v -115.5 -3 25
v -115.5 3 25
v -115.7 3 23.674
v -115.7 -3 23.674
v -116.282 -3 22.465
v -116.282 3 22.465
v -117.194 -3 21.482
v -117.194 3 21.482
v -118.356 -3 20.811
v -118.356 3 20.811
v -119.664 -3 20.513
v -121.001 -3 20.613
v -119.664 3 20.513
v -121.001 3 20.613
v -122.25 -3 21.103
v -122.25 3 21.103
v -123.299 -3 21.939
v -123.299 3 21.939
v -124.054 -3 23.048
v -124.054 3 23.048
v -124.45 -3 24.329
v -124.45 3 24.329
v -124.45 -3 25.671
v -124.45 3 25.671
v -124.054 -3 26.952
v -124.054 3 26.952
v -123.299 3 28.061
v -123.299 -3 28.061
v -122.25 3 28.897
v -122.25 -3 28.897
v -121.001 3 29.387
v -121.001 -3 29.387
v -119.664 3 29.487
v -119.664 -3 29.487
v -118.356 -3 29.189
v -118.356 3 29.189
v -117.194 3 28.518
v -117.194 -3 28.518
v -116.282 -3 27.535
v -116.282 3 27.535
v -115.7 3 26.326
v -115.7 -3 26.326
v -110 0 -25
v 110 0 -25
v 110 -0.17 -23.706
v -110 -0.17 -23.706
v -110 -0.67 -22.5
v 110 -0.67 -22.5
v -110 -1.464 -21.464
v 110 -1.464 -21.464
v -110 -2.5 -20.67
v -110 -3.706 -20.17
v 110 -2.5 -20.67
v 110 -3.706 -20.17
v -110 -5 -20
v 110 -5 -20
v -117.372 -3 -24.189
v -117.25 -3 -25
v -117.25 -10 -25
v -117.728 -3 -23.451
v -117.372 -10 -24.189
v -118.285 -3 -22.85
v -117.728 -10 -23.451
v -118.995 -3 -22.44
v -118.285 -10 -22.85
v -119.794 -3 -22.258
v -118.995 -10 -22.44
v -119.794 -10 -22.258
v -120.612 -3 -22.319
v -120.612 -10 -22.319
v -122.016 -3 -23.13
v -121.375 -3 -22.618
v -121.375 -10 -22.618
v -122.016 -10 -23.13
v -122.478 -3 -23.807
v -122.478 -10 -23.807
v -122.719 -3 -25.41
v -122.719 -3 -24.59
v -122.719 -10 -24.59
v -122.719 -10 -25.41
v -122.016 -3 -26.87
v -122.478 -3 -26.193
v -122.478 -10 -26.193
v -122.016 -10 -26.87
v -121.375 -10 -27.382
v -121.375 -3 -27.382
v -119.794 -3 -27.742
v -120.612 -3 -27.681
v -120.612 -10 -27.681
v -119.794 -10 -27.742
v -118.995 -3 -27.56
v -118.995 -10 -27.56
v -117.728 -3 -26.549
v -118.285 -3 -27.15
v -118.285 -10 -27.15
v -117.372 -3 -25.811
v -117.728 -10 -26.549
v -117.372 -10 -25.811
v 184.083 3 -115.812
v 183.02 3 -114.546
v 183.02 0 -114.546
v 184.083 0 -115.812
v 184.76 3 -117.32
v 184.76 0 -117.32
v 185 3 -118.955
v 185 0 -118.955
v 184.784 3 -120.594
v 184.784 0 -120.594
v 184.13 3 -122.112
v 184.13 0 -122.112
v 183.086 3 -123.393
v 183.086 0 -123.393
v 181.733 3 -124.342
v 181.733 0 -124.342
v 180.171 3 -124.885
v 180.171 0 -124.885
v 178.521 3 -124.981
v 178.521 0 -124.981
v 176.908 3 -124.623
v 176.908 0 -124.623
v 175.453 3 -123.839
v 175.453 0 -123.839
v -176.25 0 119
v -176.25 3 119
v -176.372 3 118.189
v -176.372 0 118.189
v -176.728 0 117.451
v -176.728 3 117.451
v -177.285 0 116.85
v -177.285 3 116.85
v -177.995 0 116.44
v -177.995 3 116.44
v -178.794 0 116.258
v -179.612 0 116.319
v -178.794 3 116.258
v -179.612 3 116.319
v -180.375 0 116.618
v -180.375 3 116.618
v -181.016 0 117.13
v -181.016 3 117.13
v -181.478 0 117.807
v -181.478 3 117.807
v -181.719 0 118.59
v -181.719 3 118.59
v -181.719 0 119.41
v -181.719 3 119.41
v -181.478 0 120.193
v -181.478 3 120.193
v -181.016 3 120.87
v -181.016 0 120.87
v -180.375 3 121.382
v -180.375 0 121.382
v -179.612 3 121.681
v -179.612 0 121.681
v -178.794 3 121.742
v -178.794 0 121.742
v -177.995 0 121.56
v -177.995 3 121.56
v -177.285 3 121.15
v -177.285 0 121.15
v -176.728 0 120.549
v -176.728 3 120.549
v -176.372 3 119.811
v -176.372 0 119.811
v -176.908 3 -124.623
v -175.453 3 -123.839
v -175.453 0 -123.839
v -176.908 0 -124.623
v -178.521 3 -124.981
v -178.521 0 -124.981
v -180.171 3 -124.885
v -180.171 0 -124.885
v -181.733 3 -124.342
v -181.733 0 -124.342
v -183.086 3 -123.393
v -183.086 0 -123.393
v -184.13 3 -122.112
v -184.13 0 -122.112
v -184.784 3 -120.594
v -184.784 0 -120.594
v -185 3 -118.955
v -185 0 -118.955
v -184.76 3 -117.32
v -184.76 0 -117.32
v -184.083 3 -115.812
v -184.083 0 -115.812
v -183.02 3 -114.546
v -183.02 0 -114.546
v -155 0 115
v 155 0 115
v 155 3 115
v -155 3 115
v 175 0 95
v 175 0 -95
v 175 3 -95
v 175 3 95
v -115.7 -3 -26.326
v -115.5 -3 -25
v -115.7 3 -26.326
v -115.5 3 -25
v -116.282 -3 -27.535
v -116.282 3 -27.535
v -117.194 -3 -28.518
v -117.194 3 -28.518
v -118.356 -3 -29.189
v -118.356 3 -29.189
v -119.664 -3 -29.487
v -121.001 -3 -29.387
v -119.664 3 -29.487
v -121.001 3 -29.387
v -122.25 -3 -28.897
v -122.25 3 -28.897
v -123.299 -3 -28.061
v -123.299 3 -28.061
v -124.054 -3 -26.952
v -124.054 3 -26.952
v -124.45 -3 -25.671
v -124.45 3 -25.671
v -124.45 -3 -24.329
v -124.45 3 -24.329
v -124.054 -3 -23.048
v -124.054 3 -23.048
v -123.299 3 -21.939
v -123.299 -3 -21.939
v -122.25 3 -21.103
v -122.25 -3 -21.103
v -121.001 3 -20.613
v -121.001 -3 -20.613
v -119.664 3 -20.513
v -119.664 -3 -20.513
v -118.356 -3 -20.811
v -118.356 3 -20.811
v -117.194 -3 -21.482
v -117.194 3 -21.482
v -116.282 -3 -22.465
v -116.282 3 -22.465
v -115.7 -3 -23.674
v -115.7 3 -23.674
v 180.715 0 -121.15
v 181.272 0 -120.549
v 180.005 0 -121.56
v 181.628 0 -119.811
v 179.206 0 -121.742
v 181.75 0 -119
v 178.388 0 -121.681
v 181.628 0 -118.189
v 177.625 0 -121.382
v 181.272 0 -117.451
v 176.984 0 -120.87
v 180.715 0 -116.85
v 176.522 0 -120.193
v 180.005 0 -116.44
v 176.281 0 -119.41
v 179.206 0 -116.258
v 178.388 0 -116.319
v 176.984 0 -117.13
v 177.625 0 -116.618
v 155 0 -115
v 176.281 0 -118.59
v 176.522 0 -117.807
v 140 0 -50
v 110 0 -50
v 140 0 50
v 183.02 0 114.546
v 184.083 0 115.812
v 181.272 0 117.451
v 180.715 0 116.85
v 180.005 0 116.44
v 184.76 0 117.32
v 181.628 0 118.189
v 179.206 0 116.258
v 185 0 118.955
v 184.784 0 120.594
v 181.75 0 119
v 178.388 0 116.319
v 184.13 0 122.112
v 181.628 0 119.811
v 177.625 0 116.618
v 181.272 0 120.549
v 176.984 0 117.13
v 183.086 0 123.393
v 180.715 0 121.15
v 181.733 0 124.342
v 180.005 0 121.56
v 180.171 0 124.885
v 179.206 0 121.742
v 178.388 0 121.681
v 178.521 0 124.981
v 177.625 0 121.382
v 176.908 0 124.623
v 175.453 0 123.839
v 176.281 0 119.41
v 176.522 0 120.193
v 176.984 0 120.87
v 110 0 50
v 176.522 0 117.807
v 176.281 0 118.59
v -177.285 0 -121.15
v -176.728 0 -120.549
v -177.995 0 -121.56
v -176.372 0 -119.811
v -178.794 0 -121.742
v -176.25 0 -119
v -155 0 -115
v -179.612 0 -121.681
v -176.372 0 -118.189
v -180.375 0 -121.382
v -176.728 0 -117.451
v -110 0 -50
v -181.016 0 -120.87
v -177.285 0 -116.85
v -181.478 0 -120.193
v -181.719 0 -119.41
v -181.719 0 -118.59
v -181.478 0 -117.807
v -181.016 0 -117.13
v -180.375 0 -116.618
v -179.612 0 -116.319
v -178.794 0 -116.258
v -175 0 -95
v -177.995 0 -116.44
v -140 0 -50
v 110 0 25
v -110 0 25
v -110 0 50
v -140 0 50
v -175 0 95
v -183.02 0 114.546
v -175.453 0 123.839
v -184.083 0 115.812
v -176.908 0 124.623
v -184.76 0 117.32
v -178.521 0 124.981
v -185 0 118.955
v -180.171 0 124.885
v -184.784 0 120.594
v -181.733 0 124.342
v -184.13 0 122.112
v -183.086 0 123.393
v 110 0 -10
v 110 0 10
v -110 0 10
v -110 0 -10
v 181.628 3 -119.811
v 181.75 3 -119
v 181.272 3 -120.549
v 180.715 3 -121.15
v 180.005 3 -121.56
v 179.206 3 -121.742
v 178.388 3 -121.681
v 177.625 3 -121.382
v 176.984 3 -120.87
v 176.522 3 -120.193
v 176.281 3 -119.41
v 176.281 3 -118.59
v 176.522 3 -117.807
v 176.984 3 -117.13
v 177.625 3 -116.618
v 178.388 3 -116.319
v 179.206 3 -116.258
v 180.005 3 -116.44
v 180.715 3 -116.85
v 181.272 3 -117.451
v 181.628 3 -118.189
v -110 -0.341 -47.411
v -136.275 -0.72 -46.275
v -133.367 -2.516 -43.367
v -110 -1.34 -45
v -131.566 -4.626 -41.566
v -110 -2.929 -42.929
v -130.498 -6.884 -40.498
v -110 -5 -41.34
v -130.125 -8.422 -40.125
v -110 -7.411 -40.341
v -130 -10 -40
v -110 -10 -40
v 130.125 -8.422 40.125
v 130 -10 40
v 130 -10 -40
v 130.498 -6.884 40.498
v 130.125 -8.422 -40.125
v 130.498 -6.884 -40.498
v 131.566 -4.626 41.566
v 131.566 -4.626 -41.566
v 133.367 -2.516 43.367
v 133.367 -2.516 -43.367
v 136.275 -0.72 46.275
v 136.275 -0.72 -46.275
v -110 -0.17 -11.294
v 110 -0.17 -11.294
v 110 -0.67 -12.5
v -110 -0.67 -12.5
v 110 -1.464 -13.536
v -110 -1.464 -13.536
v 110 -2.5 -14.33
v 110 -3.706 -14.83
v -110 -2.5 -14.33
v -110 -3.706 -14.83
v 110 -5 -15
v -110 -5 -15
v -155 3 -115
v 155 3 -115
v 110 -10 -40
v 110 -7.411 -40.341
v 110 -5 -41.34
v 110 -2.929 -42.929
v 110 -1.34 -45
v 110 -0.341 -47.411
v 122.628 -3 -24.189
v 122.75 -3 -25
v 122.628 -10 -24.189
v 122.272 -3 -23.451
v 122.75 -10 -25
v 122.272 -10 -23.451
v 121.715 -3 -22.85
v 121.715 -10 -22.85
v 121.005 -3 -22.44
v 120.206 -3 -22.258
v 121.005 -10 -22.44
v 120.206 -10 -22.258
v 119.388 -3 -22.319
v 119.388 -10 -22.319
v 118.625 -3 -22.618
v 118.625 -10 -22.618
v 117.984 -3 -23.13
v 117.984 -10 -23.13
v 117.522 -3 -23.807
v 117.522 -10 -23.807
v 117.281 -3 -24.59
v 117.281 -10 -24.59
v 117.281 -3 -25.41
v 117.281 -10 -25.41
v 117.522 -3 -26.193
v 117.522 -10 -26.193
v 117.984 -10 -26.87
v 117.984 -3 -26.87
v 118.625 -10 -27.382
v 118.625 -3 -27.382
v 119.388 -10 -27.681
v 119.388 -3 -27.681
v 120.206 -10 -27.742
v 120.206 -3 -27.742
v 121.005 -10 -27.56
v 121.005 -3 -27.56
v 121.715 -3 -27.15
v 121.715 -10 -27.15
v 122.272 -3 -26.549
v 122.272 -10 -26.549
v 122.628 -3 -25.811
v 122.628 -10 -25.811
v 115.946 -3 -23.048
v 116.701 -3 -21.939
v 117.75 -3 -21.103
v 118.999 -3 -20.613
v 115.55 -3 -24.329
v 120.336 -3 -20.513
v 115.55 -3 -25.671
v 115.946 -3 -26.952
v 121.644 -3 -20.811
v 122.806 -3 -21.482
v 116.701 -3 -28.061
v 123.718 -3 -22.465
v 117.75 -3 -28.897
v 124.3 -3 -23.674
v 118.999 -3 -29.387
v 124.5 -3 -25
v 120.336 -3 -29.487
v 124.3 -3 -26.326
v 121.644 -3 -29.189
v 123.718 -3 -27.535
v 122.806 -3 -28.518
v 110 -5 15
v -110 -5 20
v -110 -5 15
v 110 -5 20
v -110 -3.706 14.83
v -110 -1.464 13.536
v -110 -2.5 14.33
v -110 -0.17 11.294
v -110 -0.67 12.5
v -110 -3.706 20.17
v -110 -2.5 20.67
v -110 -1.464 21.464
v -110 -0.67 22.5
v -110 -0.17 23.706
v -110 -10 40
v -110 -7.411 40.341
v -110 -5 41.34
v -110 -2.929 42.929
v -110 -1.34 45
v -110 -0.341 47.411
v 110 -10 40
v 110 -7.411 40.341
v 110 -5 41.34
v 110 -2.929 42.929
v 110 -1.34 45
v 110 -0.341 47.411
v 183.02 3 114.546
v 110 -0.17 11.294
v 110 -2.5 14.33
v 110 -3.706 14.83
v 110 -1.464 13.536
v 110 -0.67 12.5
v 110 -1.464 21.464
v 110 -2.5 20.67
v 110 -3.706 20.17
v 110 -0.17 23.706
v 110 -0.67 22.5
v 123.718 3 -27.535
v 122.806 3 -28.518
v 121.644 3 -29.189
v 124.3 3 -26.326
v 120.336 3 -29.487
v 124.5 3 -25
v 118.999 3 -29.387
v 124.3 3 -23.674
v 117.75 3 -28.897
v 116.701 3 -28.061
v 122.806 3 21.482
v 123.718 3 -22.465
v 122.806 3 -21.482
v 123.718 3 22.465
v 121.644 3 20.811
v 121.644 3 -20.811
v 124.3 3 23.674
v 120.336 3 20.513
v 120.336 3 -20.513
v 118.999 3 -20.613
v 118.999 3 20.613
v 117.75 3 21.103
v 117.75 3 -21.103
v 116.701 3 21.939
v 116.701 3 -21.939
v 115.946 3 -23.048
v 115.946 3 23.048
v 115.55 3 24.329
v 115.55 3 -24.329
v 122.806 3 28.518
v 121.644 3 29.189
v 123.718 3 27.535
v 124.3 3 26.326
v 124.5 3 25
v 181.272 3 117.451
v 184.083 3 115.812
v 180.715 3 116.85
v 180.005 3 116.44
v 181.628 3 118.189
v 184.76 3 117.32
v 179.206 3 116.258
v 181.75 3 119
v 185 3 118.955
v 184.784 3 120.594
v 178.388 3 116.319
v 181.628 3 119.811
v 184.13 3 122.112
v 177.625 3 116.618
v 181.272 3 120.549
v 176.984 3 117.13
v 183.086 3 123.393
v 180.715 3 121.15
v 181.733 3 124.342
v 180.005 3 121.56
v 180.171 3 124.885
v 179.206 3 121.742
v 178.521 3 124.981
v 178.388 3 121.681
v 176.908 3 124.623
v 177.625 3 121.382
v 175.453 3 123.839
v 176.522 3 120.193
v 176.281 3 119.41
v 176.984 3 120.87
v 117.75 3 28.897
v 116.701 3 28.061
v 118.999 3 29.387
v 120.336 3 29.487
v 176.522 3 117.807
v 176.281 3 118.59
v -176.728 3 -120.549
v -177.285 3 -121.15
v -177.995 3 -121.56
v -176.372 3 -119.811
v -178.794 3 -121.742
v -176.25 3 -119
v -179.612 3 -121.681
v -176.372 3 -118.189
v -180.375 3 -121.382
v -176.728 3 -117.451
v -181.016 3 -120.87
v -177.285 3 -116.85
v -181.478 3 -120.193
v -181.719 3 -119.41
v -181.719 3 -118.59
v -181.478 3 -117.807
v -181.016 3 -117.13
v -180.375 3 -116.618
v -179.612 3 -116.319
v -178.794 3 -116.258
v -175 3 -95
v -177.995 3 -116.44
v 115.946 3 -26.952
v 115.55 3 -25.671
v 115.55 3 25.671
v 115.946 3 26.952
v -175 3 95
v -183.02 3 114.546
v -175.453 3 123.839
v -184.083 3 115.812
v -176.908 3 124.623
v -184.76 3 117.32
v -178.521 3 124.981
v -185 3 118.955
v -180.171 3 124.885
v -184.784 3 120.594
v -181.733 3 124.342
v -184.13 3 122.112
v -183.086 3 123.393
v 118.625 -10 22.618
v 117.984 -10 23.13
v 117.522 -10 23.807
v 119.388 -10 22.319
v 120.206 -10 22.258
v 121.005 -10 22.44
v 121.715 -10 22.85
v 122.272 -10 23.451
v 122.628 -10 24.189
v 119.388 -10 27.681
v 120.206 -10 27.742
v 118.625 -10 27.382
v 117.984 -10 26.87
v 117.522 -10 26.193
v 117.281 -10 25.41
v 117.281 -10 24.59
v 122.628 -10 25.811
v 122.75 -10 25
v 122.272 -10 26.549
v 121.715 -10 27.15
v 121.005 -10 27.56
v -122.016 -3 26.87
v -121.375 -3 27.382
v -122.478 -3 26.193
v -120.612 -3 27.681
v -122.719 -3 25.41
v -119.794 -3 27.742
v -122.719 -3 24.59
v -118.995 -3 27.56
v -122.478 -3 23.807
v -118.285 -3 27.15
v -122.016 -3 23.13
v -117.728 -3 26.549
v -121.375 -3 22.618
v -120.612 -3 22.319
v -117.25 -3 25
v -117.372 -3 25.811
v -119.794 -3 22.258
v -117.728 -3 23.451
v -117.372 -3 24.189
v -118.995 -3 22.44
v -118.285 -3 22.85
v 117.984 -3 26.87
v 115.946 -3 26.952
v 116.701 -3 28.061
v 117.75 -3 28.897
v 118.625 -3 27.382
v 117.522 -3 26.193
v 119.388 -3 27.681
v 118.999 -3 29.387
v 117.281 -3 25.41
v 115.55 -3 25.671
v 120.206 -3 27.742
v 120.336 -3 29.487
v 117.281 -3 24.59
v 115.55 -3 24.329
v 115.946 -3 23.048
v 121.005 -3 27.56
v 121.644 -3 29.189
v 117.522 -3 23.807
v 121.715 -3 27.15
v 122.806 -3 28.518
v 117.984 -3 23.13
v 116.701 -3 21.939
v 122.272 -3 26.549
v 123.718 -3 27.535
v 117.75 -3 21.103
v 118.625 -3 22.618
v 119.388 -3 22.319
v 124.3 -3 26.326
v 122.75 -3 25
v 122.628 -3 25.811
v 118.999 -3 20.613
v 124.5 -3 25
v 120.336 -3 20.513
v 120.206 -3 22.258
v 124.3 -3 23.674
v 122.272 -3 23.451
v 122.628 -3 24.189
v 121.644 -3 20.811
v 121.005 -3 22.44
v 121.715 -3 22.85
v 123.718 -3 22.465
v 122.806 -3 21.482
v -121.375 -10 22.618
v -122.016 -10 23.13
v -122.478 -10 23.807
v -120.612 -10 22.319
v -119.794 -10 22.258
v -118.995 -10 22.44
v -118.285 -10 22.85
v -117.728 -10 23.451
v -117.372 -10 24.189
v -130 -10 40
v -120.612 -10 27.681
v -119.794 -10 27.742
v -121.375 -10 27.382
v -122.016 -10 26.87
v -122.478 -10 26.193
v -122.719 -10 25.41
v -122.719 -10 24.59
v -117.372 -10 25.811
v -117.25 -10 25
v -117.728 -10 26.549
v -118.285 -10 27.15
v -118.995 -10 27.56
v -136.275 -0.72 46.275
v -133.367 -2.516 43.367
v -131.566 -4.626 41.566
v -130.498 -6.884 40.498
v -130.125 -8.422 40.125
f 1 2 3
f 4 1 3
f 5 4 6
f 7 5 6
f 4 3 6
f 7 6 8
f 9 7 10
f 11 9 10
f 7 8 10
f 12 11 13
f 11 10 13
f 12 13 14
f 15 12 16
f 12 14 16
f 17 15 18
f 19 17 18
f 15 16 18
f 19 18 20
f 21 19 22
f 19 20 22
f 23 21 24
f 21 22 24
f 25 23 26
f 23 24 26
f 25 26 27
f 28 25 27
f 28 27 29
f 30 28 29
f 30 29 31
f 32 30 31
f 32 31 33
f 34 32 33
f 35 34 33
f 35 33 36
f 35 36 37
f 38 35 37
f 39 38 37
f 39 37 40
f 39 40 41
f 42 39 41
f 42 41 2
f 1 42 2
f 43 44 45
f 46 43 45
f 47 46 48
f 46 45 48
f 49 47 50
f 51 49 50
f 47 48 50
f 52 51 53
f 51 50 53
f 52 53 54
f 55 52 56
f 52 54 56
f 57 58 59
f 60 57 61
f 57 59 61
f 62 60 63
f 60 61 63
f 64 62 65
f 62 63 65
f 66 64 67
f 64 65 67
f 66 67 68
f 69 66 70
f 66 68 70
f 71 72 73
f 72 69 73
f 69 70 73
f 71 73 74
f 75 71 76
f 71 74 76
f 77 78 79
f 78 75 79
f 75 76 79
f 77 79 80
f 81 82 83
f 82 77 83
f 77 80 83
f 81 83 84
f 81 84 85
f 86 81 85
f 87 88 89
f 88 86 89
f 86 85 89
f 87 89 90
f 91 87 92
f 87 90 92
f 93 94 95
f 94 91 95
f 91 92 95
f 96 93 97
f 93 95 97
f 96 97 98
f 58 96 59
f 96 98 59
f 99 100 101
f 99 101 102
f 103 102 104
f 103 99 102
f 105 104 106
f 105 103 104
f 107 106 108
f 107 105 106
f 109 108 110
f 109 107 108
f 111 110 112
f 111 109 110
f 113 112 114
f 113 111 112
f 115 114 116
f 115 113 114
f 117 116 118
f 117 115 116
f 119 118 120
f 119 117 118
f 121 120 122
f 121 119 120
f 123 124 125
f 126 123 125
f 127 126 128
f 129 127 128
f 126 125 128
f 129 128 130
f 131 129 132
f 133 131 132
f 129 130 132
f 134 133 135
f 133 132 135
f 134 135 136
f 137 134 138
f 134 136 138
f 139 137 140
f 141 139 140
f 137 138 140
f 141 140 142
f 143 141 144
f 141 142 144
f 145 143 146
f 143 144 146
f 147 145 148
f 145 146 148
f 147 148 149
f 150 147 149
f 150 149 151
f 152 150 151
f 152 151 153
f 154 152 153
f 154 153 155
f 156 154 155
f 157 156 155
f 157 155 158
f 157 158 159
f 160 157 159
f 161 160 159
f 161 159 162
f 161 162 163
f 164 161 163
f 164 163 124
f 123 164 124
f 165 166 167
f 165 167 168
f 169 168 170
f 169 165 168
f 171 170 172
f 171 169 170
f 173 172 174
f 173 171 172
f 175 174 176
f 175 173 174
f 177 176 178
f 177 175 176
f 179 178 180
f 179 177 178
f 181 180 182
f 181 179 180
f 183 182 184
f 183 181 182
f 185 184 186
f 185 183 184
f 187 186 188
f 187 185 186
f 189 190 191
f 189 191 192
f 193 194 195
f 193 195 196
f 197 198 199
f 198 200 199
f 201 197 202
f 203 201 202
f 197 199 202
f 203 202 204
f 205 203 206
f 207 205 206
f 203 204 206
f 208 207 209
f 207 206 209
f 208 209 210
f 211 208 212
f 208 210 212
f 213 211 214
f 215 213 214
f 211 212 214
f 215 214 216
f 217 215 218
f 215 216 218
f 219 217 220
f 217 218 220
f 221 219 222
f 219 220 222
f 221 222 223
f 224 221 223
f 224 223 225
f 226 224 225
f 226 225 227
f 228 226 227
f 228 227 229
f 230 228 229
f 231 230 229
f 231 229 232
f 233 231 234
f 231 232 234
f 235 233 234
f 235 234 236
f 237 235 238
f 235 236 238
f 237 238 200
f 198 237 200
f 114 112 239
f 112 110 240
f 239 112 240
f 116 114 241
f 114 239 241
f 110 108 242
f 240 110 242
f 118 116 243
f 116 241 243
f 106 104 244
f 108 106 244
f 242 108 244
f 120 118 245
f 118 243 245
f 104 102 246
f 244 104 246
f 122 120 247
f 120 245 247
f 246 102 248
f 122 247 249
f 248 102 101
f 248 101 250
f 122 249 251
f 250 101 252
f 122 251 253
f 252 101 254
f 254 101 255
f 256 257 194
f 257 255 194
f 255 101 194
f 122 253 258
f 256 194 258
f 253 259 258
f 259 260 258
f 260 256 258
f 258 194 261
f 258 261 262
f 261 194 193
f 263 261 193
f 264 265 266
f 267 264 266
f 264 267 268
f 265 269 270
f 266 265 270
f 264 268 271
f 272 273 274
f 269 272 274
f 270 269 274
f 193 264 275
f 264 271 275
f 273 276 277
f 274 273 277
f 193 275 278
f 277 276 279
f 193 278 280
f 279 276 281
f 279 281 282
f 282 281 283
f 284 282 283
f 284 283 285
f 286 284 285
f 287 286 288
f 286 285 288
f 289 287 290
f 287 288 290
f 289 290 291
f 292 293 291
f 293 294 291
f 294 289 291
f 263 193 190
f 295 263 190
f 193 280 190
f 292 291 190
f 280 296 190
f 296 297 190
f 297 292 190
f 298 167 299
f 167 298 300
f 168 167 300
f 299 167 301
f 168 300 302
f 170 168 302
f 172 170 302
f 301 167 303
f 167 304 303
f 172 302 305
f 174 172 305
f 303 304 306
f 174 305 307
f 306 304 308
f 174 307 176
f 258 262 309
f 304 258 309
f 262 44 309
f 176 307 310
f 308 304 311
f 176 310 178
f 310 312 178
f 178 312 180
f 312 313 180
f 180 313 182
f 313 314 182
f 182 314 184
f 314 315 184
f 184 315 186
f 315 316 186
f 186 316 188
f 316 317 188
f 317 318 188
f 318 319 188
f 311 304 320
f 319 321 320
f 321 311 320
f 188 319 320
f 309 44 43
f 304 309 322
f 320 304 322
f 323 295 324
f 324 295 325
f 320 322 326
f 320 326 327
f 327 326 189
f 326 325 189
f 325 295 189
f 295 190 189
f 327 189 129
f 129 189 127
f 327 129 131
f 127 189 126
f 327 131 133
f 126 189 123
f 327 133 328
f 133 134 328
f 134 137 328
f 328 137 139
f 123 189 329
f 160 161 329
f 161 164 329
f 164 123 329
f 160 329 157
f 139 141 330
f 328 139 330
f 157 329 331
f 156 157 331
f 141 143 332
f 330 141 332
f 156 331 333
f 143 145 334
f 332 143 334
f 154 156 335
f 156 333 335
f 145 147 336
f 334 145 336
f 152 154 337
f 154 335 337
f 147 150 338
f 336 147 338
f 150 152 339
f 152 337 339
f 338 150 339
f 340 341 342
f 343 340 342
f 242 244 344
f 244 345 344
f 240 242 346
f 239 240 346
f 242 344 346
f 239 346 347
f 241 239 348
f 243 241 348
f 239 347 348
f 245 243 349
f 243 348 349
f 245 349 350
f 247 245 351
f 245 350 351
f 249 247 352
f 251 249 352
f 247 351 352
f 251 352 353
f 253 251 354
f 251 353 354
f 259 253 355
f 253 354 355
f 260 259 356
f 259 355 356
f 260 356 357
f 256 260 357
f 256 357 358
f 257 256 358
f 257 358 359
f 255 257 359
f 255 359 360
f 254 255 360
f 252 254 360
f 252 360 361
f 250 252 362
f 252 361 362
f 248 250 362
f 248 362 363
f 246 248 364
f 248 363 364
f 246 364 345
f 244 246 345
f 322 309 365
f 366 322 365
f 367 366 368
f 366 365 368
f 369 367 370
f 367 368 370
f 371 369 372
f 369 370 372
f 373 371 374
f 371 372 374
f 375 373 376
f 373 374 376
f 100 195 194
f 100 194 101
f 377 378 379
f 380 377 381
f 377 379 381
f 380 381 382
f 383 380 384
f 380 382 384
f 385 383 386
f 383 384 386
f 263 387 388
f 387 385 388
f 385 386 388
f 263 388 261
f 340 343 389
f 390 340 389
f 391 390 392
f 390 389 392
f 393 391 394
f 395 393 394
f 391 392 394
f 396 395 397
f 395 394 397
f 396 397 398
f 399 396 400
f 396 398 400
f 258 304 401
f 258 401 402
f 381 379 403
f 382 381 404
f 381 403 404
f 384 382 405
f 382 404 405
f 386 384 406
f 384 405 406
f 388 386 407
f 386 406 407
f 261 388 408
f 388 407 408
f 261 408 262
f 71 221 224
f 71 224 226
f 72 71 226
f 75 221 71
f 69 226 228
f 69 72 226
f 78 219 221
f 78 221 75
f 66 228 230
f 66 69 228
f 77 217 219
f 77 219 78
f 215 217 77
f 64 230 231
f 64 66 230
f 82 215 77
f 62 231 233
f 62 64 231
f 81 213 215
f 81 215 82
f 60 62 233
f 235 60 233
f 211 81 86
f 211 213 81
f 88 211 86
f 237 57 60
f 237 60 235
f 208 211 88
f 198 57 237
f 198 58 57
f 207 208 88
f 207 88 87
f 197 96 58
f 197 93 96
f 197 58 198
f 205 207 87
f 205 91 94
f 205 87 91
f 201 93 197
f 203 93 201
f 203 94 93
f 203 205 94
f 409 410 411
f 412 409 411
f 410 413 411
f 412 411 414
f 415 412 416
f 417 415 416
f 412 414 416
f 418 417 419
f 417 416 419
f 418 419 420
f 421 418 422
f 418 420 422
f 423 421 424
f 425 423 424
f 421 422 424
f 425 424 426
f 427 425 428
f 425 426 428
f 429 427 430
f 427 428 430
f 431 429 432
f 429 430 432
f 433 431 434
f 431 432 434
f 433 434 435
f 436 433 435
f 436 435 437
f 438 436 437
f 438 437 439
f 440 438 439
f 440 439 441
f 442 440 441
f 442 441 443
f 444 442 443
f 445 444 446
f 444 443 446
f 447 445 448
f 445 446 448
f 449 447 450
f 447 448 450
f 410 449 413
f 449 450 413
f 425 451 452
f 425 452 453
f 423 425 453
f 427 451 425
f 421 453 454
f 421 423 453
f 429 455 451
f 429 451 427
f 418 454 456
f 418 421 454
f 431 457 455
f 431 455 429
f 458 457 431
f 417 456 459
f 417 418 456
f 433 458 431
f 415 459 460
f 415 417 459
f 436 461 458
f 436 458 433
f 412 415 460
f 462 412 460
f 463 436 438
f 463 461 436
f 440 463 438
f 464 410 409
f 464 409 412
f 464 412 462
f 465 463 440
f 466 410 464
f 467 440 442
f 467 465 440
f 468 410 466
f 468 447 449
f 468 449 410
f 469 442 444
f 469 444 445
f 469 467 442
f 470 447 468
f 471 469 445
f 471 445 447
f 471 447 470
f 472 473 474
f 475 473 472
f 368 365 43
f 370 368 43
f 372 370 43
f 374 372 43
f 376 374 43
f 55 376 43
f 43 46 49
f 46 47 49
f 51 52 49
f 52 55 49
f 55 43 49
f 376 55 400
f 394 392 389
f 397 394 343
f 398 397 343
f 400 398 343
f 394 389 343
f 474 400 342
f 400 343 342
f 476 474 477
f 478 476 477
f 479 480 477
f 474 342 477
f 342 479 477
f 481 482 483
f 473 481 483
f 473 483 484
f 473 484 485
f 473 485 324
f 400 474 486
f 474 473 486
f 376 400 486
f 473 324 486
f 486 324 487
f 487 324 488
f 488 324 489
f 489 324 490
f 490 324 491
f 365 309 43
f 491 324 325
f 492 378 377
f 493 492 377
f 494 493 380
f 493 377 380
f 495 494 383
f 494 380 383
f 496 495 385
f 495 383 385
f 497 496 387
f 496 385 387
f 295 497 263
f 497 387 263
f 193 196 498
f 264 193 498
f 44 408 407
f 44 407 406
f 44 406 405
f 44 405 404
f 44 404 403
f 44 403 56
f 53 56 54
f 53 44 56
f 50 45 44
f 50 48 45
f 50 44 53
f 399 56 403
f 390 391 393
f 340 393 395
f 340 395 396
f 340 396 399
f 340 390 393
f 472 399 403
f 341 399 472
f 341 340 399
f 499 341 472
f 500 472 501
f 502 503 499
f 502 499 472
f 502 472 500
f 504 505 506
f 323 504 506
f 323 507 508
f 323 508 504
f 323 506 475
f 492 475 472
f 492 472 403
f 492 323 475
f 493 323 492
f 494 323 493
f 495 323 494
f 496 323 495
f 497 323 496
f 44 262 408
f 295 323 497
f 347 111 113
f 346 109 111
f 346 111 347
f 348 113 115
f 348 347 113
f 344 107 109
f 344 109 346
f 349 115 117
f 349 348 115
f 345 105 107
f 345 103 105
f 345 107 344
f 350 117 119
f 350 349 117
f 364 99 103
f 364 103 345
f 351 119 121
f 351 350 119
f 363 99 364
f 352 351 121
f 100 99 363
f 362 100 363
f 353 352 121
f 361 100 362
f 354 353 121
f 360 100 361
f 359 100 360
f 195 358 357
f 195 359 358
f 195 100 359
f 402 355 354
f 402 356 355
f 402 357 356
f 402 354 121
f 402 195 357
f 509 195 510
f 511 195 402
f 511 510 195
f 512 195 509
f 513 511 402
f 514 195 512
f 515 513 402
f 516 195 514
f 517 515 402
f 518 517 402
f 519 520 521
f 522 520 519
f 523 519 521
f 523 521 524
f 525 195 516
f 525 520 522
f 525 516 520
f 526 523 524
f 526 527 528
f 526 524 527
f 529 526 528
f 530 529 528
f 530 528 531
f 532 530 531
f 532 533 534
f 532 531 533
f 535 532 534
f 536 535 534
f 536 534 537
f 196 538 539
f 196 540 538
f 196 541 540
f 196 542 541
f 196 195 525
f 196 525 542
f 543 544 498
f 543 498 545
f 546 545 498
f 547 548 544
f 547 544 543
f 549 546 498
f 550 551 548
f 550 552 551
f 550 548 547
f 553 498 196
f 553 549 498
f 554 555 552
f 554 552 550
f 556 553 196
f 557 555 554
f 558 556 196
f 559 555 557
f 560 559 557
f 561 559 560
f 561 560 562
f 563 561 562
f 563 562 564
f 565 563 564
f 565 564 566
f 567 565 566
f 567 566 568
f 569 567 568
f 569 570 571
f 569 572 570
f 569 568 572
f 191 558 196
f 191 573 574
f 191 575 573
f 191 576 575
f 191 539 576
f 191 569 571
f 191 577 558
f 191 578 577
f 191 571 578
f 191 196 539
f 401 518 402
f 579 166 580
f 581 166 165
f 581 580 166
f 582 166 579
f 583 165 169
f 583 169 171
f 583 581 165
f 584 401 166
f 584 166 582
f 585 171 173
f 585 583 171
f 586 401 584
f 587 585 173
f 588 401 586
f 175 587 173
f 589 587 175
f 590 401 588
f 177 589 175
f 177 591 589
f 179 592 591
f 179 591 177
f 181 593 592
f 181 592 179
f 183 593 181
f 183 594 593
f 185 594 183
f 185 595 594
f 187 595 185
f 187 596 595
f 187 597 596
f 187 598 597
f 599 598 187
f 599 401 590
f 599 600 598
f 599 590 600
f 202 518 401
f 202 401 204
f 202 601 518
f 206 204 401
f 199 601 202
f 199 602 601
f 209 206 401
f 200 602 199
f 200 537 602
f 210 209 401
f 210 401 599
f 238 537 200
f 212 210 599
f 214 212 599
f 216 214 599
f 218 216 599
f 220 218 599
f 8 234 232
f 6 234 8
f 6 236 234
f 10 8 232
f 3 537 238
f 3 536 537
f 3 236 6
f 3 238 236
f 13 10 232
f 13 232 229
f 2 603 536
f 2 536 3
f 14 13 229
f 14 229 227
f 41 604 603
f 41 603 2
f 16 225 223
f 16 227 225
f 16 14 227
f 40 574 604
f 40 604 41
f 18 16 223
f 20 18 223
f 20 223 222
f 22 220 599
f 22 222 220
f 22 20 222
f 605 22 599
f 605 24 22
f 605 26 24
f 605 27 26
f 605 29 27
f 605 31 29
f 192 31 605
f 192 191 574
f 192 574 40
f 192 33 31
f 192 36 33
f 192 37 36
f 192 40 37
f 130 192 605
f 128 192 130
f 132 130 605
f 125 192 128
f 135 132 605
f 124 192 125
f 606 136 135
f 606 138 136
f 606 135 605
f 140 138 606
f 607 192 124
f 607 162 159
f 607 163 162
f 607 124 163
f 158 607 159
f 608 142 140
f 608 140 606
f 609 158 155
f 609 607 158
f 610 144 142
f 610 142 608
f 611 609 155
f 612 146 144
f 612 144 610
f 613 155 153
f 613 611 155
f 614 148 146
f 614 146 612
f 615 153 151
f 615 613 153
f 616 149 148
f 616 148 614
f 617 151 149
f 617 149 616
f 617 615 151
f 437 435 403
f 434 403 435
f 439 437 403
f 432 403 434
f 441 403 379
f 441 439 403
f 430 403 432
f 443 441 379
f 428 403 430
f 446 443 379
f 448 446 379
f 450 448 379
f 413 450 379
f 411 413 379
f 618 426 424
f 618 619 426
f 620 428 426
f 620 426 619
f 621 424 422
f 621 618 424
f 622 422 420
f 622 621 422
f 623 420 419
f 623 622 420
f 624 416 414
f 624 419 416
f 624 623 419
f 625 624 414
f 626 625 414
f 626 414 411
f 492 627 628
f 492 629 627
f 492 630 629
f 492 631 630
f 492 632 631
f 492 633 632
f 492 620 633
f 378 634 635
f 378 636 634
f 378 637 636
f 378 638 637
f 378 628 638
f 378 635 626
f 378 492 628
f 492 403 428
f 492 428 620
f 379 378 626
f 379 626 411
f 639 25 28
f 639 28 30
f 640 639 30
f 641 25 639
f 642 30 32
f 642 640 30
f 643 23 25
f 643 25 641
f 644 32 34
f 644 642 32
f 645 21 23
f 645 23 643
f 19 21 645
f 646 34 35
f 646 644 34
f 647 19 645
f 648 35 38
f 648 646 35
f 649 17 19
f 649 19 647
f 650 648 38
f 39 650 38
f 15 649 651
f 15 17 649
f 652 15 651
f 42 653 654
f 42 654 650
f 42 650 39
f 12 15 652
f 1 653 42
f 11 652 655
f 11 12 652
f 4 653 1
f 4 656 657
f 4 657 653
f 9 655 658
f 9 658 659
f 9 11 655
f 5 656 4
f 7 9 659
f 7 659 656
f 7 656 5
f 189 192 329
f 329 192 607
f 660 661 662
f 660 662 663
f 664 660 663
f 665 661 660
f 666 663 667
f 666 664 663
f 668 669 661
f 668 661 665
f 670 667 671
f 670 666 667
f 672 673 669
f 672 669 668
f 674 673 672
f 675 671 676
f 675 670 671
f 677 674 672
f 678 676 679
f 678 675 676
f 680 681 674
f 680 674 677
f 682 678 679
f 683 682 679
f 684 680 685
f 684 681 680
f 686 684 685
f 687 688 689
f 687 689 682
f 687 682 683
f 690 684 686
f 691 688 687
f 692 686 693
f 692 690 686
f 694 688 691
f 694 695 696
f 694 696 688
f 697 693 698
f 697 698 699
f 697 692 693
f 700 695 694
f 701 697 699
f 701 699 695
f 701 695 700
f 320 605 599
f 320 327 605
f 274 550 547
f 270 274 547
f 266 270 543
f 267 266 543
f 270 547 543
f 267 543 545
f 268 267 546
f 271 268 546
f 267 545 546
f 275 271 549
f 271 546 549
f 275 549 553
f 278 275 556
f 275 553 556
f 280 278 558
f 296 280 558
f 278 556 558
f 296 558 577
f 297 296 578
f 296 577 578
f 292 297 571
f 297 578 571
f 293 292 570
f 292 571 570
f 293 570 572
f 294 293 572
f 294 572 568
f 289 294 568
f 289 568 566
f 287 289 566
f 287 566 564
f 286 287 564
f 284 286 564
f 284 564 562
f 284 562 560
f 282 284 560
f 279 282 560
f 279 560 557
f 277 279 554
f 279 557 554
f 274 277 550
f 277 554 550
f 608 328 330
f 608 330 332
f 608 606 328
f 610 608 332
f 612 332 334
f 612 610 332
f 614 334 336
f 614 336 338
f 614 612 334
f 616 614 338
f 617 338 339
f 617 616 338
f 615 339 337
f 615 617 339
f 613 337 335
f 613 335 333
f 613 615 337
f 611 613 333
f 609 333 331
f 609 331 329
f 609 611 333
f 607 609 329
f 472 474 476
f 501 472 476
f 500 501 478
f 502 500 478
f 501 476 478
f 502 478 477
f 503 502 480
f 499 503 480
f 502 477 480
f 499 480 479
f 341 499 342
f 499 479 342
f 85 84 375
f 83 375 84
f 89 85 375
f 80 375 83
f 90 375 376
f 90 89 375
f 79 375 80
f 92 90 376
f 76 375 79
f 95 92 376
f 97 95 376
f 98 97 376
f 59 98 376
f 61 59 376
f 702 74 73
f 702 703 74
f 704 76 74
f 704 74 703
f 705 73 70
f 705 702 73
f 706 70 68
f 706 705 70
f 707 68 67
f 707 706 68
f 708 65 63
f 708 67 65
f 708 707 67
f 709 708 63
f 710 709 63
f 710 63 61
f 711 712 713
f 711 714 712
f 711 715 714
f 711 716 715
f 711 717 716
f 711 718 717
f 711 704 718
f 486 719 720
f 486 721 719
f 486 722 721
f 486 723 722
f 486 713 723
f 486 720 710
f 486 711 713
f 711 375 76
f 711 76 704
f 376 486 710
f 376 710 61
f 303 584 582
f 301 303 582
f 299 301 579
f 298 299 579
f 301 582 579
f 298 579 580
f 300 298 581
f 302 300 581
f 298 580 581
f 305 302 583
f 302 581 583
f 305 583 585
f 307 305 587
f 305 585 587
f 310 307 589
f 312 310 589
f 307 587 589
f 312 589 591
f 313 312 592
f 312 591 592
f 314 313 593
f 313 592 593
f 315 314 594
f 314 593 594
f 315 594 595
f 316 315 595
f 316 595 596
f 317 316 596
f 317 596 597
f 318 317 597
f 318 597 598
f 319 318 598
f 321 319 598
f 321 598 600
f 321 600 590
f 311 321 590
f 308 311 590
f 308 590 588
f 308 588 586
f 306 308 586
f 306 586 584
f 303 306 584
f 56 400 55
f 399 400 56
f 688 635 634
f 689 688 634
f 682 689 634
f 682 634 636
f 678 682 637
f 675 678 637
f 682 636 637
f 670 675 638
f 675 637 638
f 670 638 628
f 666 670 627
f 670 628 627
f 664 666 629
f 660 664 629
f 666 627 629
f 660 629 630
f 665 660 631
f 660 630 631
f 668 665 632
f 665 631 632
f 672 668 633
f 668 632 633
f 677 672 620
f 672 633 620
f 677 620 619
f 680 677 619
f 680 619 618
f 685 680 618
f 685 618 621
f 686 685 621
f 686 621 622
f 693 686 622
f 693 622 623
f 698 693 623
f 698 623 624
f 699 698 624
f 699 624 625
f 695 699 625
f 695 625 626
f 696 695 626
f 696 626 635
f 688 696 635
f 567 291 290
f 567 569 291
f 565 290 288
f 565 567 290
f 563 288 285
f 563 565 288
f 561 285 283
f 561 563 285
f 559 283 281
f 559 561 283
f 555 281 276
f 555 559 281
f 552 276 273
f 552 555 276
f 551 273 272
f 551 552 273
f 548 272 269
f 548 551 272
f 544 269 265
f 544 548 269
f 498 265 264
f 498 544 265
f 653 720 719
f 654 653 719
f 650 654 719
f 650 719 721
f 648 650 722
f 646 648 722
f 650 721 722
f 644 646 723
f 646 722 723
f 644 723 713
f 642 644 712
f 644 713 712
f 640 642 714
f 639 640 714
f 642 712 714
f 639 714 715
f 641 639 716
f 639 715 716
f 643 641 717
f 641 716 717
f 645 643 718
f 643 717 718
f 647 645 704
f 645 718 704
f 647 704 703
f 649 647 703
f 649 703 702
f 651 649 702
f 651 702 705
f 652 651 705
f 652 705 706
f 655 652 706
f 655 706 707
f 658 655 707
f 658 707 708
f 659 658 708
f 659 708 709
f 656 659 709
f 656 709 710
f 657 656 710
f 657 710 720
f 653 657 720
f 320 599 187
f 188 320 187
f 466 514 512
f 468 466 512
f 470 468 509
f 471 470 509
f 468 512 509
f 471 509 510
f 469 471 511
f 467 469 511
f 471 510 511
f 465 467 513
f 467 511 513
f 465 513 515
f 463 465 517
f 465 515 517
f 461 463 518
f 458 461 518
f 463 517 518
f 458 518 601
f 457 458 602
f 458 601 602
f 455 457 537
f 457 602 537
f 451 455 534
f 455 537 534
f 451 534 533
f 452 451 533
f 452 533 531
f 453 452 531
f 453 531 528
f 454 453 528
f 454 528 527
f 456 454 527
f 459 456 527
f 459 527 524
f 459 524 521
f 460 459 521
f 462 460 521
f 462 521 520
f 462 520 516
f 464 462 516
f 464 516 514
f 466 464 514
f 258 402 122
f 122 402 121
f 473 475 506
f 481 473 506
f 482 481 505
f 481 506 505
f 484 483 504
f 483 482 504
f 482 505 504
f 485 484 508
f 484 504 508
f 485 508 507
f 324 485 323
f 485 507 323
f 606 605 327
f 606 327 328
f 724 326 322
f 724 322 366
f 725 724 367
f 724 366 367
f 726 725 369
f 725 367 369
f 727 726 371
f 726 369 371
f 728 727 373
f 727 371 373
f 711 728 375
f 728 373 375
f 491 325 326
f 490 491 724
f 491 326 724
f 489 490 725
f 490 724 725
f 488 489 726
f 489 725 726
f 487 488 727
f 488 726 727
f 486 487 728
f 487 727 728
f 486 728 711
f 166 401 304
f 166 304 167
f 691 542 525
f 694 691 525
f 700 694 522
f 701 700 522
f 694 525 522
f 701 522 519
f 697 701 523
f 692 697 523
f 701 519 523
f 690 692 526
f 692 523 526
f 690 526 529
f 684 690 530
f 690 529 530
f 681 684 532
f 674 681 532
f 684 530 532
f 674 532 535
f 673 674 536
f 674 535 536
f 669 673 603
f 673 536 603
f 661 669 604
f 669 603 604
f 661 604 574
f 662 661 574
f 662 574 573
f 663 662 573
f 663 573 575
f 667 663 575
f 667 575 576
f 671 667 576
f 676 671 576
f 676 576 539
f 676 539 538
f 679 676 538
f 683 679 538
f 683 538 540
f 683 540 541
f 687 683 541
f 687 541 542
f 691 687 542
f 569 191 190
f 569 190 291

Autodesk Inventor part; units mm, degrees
ref_plane "YZ Plane" through (0, 0, 0) normal (1, 0, 0) x (0, 1, 0)
ref_plane "XZ Plane" through (0, 0, 0) normal (0, 1, 0) x (-1, 0, 0)
ref_plane "XY Plane" through (0, 0, 0) normal (0, 0, 1) x (1, 0, 0)
sketch "Sketch1" plane through (0, 0, 0) normal (0, 1, 0) x (-1, 0, 0)
  line L0 (175, -115) -> (-175, -115)
  line L1 (-175, -115) -> (-175, 115)
  line L2 (-175, 115) -> (175, 115)
  line L3 (175, 115) -> (175, -115)
  line L4 (0, -115) -> (0, 115) construction
  line L5 (175, 0) -> (-175, 0) construction
  point P0 (0, 0)
  point P1 (0, 0)
  dimension "d0" = 350
  dimension "d1" = 230
extrude "Extrusion1" add sketch "Sketch1" along normal blind 3
sketch "Sketch2" plane through (0, 0, 0) normal (0, -1, 0) x (1, 0, 0)
  line L0 (175, -115) -> (-175, -115) construction
  line L1 (0, -115) -> (0, 115) construction
  line L2 (-175, 115) -> (175, 115) construction
  line L3 (130, -40) -> (110, -40)
  line L4 (110, -40) -> (110, 40)
  line L5 (110, 40) -> (130, 40)
  line L6 (130, 40) -> (130, -40)
  line L7 (130, 0) -> (110, 0) construction
  line L8 (0, 0) -> (175, 0) construction
  line L9 (175, 115) -> (175, -115) construction
  line L10 (-130, -40) -> (-110, -40)
  line L11 (-110, -40) -> (-110, 40)
  line L12 (-110, 40) -> (-130, 40)
  line L13 (-130, 40) -> (-130, -40)
  dimension "d4" = 20
  dimension "d5" = 80
  dimension "d6" = 220
extrude "Extrusion2" add sketch "Sketch2" along normal blind 10
sketch "Sketch3" plane through (0, -10, 0) normal (0, -1, 0) x (1, 0, 0)
  line L0 (175, 115) -> (-175, 115) construction
  line L1 (0, 115) -> (0, -115) construction
  line L2 (175, -115) -> (-175, -115) construction
  line L3 (0, 0) -> (-175, 0) construction
  line L4 (-175, 115) -> (-175, -115) construction
  line L5 (-110, 40) -> (-130, 40) construction
  line L6 (-120, 40) -> (-120, -40) construction
  line L7 (-130, -40) -> (-110, -40) construction
  circle A0 centre (-120, 25) radius 2.75
  circle A1 centre (-120, -25) radius 2.75
  circle A2 centre (120, 25) radius 2.75
  circle A3 centre (120, -25) radius 2.75
  dimension "d9" = 5.5
  dimension "d10" = 15
extrude "Extrusion3" cut sketch "Sketch3" against normal up to next
sketch "Sketch4" plane through (0, 0, 0) normal (0, -1, 0) x (1, 0, 0)
  line L0 (110, 40) -> (110, -40) construction
  line L1 (110, 0) -> (-110, 0) construction
  line L2 (-110, -40) -> (-110, 40) construction
  line L3 (110, 15) -> (-110, 15)
  line L4 (-110, 15) -> (-110, 20)
  line L5 (-110, 20) -> (110, 20)
  line L6 (110, 20) -> (110, 15)
  line L7 (110, -15) -> (-110, -15)
  line L8 (-110, -15) -> (-110, -20)
  line L9 (-110, -20) -> (110, -20)
  line L10 (110, -20) -> (110, -15)
  point P0 (0, 0)
  dimension "d13" = 5
  dimension "d14" = 30
extrude "Extrusion4" add sketch "Sketch4" along normal blind 5
fillet "Fillet1" radius 10 6 edges at (120, 0, 40) (130, 0, 0) (120, 0, -40) (-120, 0, 40) (-130, 0, 0) (-120, 0, -40)
fillet "Fillet2" radius 5 4 edges at (0, 0, 20) (0, 0, -15) (0, 0, 15) (0, 0, -20)
sketch "Sketch5" plane through (0, 3, 0) normal (0, 1, 0) x (1, 0, 0)
  line L0 (-175, -115) -> (-175, 115) construction
  line L1 (-175, 0) -> (175, 0) construction
  line L2 (175, -115) -> (175, 115) construction
  line L3 (175, -115) -> (-175, -115) construction
  line L4 (0, -115) -> (0, 115) construction
  line L5 (-175, 115) -> (175, 115) construction
  circle A0 centre (-120, 25) radius 2.75 projected
  circle A1 centre (-120, 25) radius 4.5
  circle A2 centre (-120, -25) radius 4.5
  circle A3 centre (120, 25) radius 4.5
  circle A4 centre (120, -25) radius 4.5
  point P0 (0, 0)
  dimension "d19" = 9
extrude "Extrusion5" cut sketch "Sketch5" against normal blind 6
sketch "Sketch6" plane through (0, 3, 0) normal (0, 1, 0) x (1, 0, 0)
  line L0 (175, 115) -> (-175, 115) construction
  line L1 (0, 115) -> (0, -115) construction
  line L2 (175, -115) -> (-175, -115) construction
  line L3 (-175, 115) -> (-175, -115) construction
  line L4 (-175, 0) -> (175, 0) construction
  line L5 (175, -115) -> (175, 115) construction
  circle A0 centre (-179, 119) radius 6
  line L6 (-175, 115) -> (-179, 115) construction
  line L7 (-179, 115) -> (-179, 119) construction
  line L8 (-179, 119) -> (-175, 119) construction
  line L9 (-175, 119) -> (-175, 115) construction
  line L10 (-155, 115) -> (-175.4528, 123.8392)
  line L11 (-175, 95) -> (-183.0203, 114.5461)
  line L12 (-175, 95) -> (-175, 115)
  line L13 (-155, 115) -> (-175, 115)
  circle A1 centre (-179, -119) radius 6
  line L14 (-155, -115) -> (-175.4528, -123.8392)
  line L15 (-175, -95) -> (-183.0203, -114.5461)
  line L16 (-175, -95) -> (-175, -115)
  line L17 (-155, -115) -> (-175, -115)
  circle A2 centre (179, 119) radius 6
  line L18 (155, 115) -> (175.4528, 123.8392)
  line L19 (175, 95) -> (183.0203, 114.5461)
  line L20 (175, 95) -> (175, 115)
  line L21 (155, 115) -> (175, 115)
  line L22 (175, -95) -> (183.0203, -114.5461)
  circle A3 centre (179, -119) radius 6
  line L23 (155, -115) -> (175.4528, -123.8392)
  line L24 (155, -115) -> (175, -115)
  line L25 (175, -95) -> (175, -115)
  circle A4 centre (179, -119) radius 2.75
  circle A5 centre (179, 119) radius 2.75
  circle A6 centre (-179, -119) radius 2.75
  circle A7 centre (-179, 119) radius 2.75
  point P0 (0, 0)
  dimension "d22" = 12
  dimension "d23" = 4
  dimension "d24" = 4
  dimension "d25" = 20
  dimension "d26" = 20
  dimension "d30" = 5.5
extrude "Extrusion6" add sketch "Sketch6" against normal blind 3 contours A0 L13 L12 | A0 L10 L13 | A0 L12 L11 | A1 L16 L17 | L15 L16 A1 | A1 L17 L14 | A2 L20 L21 | A2 L21 L18 | L19 L20 A2 | L22 A3 L25 | A3 L24 L25 | A3 L23 L24 picked at (-175.087, 116.3056) picked at (-175.087, -116.3056) picked at (175.0917, 116.2969) picked at (175.0917, -116.2969)
properties part number "vna_mount"
